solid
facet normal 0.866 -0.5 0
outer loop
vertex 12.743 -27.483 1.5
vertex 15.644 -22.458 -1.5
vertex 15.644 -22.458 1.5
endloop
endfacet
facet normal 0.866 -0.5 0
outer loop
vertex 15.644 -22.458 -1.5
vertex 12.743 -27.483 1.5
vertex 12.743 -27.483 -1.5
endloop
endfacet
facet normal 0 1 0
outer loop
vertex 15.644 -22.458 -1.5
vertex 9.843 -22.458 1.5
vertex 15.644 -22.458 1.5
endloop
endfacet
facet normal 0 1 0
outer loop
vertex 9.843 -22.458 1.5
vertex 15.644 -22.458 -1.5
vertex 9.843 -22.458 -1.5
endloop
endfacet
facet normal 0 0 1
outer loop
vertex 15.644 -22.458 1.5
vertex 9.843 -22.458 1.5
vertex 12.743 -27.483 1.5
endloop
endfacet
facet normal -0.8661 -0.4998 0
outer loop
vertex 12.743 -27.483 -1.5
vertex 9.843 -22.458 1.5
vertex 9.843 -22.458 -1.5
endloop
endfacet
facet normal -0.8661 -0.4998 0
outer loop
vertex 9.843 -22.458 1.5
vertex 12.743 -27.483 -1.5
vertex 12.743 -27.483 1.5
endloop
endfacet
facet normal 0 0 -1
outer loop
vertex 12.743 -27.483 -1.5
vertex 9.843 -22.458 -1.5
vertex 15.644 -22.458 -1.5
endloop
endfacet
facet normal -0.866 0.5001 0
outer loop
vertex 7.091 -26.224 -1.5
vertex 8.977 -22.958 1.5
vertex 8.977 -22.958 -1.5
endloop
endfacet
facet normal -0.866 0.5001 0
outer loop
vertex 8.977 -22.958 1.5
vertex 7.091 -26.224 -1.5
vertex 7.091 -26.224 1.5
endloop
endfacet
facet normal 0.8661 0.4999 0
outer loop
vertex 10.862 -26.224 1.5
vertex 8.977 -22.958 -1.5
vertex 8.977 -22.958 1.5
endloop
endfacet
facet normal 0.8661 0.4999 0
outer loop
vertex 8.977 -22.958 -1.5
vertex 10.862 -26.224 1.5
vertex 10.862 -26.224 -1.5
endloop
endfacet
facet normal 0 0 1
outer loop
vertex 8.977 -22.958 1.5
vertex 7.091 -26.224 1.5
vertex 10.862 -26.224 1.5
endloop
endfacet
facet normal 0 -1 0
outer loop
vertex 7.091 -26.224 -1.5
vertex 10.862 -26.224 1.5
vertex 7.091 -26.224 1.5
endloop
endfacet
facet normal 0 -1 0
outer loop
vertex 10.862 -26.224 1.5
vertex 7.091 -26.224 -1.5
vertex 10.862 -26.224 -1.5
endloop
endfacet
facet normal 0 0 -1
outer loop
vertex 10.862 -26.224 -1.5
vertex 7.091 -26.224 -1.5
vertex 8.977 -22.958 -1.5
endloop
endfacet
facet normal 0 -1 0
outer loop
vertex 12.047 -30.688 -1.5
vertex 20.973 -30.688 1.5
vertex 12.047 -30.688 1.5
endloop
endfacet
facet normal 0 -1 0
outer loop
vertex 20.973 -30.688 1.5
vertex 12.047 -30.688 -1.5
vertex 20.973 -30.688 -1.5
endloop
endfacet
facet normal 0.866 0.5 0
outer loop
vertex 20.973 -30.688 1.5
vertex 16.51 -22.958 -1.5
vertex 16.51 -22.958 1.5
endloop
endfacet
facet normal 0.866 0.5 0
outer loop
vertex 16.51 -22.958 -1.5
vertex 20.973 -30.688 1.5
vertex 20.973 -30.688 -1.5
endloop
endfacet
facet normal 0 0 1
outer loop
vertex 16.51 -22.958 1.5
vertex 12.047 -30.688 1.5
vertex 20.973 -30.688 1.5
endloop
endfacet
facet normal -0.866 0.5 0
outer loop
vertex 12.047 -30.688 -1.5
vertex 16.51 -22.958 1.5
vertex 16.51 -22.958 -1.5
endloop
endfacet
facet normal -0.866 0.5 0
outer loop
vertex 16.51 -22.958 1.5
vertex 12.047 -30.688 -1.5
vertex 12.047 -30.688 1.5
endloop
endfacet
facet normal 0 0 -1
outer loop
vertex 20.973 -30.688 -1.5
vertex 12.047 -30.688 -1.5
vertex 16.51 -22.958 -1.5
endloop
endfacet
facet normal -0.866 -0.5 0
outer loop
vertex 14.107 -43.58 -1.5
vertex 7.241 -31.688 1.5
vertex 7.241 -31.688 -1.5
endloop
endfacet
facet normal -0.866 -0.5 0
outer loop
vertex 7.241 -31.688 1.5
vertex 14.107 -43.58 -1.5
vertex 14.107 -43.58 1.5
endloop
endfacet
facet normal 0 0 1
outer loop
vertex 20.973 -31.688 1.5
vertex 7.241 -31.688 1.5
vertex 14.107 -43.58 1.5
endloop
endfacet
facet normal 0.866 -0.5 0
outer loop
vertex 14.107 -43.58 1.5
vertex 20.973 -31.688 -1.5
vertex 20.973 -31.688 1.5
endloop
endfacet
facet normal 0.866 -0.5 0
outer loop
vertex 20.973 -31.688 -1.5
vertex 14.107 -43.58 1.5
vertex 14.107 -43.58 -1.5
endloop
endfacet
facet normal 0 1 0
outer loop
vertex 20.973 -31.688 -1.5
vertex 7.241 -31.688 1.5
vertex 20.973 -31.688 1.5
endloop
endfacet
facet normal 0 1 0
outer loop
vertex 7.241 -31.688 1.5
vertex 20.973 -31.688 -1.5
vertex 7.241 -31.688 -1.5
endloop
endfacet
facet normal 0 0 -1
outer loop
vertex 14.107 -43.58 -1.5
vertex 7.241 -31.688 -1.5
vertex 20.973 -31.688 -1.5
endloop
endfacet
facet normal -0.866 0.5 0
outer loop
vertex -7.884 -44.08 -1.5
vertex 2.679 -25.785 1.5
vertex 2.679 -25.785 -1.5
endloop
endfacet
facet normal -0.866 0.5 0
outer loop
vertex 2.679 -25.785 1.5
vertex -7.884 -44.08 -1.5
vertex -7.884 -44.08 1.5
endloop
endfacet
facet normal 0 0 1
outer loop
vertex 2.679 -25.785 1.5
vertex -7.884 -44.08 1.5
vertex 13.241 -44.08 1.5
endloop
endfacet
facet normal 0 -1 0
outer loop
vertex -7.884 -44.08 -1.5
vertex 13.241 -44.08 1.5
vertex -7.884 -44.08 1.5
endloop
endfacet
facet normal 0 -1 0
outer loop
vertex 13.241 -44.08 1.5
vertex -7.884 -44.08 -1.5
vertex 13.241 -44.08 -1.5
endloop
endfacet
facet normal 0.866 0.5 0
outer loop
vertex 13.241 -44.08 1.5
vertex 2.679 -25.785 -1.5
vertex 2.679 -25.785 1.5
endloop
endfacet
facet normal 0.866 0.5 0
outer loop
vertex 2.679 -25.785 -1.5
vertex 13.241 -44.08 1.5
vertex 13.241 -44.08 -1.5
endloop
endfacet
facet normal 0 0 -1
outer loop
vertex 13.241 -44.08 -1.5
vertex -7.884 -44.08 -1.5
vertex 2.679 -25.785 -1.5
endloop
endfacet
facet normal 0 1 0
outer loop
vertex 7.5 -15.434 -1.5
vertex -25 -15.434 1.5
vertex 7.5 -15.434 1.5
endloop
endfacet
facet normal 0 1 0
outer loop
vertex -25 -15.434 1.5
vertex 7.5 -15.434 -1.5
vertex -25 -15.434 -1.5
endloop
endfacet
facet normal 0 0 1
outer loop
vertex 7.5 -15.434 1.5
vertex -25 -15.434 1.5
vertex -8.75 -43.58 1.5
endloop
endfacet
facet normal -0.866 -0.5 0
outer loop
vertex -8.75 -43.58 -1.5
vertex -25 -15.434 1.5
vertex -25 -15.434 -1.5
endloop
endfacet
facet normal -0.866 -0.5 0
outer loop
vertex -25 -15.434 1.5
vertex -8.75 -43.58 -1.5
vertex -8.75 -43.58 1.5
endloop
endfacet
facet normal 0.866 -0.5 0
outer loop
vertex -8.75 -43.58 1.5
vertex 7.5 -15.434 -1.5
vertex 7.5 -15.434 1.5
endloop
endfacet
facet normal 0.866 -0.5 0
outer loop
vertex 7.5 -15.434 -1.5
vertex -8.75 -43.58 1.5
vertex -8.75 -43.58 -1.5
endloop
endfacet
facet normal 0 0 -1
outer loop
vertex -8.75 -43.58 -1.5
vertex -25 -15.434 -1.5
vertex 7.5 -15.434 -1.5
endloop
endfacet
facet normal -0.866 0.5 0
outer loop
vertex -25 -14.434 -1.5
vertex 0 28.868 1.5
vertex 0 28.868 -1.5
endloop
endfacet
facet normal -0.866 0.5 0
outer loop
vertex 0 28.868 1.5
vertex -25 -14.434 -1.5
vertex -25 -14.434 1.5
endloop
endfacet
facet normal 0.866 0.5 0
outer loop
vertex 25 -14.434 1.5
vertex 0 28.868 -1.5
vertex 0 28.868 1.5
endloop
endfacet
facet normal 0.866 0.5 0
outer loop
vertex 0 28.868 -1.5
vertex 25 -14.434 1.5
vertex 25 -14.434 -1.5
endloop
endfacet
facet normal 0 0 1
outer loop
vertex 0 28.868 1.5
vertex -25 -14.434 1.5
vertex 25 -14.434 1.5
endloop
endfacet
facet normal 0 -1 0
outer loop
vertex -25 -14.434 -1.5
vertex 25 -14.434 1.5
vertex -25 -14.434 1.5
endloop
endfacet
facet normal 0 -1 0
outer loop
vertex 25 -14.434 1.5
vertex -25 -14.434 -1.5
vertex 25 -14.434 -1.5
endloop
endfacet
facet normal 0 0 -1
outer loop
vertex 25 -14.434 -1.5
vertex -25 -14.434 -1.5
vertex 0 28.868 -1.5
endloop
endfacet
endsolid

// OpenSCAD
//---------------------------------------------------------------
//-- Recursive Pybonacci logo in 3D
//-- by Juan Gonzalez-Gomez (Obijuan)
//-- March - 2014
//--------------------------------------------------------------
//-- Note: The openscad only supports recursion from
//-- the version 2013.06.  In early version this code will not
//-- work
//---------------------------------------------------------------
//-- Released under the GPL v3 license
//---------------------------------------------------------------

//-- Pybonacci logo parameters
f = 0.65;      //-- Reduction factor
offset = 1;   //-- Distance between adjacent triangles
side = 50;    //-- Initial triangle side
ang = 60;     //-- Rotation angle
ov = [0, -1, 0];  //-- Unit vector perpendicular to the triangle's bottom side
nt = 7;  //-- Number of triangles of the logo

//-- Constants for accessing the x,y and z components
X = 0;
Y = 1;
Z = 2;

//-- Rotate a vector an angle phi around the Z axis
//-- INPUTS:t
//--   v: Vector to rotate
//--   phi: Angle to rotate (in degrees)
function Rotz(v, phi) = [v[X] * cos(phi) - v[Y] * sin(phi), 
                         v[X] * sin(phi) + v[Y] * cos(phi), 
                         0];

//-- Pybonacci triangle. The logo is composed of 
//-- 7 of these equilateral triangles
module triangle(l = 10, th = 3)
{
  rotate([0, 0, -30])
  cylinder(r = l * sqrt(3) / 3,
           h = th,
	   center = true,
           $fn = 3);
}

//-- Calculate the normal distance of the next triangle
function Nv(n) = side * pow(f, n-1) * sqrt(3)*(1 + f) / 6 + offset;

//-- Calculate the tangencial distance of the next triangle
function Tv(n) = side * pow(f, n-1) * (1 - f) / 2;

//-- Calculate the relative distance between two triangles
//-- n is the triangle number
function Rel_Posv(n) = Rotz(ov, ang * (n - 1))      * Nv(n) + 
                       Rotz(ov, ang * (n-1) -90)  * Tv(n);

//-- Colors of the triangles
logo_color = [
  [255/255, 211/255, 52/255],
  [255/255, 230/255, 113/255],
  [112/255, 164/255, 203/255],
  [80/255, 142/255, 191/255],
  [68/255, 133/255, 187/255],
  [63/255, 116/255, 168/255],
  [60/255, 97/255, 126/255]
  
];


//-- Recursive function for generating the logo
//-- n: Number of triangle
//-- pos: Position
//-- angle: Orientation angle
//-- side: triangle side length
module pybonacci_logo(n, pos, angle, side)
{
  //-- Stop when the current triangle number is higher than nt
  if (n < nt) {

    //-- Draw the current triangle (n)
    color(logo_color[n])
    translate(pos)
      rotate([0, 0, angle])
        triangle(l = side);
      
    //-- Draw the next triangle
    //-- Update the position
    //-- Update the rotation angle
    //-- Update the triangle side
    pybonacci_logo(n = n + 1,
                   pos = pos + Rel_Posv(n + 1),
 					angle = angle + ang,
                   side = side * f
                  );
  }
}

//-- Let's start the party!
pybonacci_logo(n = 0, 
               pos = [0, 0, 0], 
               angle = 0, 
               side = side);
